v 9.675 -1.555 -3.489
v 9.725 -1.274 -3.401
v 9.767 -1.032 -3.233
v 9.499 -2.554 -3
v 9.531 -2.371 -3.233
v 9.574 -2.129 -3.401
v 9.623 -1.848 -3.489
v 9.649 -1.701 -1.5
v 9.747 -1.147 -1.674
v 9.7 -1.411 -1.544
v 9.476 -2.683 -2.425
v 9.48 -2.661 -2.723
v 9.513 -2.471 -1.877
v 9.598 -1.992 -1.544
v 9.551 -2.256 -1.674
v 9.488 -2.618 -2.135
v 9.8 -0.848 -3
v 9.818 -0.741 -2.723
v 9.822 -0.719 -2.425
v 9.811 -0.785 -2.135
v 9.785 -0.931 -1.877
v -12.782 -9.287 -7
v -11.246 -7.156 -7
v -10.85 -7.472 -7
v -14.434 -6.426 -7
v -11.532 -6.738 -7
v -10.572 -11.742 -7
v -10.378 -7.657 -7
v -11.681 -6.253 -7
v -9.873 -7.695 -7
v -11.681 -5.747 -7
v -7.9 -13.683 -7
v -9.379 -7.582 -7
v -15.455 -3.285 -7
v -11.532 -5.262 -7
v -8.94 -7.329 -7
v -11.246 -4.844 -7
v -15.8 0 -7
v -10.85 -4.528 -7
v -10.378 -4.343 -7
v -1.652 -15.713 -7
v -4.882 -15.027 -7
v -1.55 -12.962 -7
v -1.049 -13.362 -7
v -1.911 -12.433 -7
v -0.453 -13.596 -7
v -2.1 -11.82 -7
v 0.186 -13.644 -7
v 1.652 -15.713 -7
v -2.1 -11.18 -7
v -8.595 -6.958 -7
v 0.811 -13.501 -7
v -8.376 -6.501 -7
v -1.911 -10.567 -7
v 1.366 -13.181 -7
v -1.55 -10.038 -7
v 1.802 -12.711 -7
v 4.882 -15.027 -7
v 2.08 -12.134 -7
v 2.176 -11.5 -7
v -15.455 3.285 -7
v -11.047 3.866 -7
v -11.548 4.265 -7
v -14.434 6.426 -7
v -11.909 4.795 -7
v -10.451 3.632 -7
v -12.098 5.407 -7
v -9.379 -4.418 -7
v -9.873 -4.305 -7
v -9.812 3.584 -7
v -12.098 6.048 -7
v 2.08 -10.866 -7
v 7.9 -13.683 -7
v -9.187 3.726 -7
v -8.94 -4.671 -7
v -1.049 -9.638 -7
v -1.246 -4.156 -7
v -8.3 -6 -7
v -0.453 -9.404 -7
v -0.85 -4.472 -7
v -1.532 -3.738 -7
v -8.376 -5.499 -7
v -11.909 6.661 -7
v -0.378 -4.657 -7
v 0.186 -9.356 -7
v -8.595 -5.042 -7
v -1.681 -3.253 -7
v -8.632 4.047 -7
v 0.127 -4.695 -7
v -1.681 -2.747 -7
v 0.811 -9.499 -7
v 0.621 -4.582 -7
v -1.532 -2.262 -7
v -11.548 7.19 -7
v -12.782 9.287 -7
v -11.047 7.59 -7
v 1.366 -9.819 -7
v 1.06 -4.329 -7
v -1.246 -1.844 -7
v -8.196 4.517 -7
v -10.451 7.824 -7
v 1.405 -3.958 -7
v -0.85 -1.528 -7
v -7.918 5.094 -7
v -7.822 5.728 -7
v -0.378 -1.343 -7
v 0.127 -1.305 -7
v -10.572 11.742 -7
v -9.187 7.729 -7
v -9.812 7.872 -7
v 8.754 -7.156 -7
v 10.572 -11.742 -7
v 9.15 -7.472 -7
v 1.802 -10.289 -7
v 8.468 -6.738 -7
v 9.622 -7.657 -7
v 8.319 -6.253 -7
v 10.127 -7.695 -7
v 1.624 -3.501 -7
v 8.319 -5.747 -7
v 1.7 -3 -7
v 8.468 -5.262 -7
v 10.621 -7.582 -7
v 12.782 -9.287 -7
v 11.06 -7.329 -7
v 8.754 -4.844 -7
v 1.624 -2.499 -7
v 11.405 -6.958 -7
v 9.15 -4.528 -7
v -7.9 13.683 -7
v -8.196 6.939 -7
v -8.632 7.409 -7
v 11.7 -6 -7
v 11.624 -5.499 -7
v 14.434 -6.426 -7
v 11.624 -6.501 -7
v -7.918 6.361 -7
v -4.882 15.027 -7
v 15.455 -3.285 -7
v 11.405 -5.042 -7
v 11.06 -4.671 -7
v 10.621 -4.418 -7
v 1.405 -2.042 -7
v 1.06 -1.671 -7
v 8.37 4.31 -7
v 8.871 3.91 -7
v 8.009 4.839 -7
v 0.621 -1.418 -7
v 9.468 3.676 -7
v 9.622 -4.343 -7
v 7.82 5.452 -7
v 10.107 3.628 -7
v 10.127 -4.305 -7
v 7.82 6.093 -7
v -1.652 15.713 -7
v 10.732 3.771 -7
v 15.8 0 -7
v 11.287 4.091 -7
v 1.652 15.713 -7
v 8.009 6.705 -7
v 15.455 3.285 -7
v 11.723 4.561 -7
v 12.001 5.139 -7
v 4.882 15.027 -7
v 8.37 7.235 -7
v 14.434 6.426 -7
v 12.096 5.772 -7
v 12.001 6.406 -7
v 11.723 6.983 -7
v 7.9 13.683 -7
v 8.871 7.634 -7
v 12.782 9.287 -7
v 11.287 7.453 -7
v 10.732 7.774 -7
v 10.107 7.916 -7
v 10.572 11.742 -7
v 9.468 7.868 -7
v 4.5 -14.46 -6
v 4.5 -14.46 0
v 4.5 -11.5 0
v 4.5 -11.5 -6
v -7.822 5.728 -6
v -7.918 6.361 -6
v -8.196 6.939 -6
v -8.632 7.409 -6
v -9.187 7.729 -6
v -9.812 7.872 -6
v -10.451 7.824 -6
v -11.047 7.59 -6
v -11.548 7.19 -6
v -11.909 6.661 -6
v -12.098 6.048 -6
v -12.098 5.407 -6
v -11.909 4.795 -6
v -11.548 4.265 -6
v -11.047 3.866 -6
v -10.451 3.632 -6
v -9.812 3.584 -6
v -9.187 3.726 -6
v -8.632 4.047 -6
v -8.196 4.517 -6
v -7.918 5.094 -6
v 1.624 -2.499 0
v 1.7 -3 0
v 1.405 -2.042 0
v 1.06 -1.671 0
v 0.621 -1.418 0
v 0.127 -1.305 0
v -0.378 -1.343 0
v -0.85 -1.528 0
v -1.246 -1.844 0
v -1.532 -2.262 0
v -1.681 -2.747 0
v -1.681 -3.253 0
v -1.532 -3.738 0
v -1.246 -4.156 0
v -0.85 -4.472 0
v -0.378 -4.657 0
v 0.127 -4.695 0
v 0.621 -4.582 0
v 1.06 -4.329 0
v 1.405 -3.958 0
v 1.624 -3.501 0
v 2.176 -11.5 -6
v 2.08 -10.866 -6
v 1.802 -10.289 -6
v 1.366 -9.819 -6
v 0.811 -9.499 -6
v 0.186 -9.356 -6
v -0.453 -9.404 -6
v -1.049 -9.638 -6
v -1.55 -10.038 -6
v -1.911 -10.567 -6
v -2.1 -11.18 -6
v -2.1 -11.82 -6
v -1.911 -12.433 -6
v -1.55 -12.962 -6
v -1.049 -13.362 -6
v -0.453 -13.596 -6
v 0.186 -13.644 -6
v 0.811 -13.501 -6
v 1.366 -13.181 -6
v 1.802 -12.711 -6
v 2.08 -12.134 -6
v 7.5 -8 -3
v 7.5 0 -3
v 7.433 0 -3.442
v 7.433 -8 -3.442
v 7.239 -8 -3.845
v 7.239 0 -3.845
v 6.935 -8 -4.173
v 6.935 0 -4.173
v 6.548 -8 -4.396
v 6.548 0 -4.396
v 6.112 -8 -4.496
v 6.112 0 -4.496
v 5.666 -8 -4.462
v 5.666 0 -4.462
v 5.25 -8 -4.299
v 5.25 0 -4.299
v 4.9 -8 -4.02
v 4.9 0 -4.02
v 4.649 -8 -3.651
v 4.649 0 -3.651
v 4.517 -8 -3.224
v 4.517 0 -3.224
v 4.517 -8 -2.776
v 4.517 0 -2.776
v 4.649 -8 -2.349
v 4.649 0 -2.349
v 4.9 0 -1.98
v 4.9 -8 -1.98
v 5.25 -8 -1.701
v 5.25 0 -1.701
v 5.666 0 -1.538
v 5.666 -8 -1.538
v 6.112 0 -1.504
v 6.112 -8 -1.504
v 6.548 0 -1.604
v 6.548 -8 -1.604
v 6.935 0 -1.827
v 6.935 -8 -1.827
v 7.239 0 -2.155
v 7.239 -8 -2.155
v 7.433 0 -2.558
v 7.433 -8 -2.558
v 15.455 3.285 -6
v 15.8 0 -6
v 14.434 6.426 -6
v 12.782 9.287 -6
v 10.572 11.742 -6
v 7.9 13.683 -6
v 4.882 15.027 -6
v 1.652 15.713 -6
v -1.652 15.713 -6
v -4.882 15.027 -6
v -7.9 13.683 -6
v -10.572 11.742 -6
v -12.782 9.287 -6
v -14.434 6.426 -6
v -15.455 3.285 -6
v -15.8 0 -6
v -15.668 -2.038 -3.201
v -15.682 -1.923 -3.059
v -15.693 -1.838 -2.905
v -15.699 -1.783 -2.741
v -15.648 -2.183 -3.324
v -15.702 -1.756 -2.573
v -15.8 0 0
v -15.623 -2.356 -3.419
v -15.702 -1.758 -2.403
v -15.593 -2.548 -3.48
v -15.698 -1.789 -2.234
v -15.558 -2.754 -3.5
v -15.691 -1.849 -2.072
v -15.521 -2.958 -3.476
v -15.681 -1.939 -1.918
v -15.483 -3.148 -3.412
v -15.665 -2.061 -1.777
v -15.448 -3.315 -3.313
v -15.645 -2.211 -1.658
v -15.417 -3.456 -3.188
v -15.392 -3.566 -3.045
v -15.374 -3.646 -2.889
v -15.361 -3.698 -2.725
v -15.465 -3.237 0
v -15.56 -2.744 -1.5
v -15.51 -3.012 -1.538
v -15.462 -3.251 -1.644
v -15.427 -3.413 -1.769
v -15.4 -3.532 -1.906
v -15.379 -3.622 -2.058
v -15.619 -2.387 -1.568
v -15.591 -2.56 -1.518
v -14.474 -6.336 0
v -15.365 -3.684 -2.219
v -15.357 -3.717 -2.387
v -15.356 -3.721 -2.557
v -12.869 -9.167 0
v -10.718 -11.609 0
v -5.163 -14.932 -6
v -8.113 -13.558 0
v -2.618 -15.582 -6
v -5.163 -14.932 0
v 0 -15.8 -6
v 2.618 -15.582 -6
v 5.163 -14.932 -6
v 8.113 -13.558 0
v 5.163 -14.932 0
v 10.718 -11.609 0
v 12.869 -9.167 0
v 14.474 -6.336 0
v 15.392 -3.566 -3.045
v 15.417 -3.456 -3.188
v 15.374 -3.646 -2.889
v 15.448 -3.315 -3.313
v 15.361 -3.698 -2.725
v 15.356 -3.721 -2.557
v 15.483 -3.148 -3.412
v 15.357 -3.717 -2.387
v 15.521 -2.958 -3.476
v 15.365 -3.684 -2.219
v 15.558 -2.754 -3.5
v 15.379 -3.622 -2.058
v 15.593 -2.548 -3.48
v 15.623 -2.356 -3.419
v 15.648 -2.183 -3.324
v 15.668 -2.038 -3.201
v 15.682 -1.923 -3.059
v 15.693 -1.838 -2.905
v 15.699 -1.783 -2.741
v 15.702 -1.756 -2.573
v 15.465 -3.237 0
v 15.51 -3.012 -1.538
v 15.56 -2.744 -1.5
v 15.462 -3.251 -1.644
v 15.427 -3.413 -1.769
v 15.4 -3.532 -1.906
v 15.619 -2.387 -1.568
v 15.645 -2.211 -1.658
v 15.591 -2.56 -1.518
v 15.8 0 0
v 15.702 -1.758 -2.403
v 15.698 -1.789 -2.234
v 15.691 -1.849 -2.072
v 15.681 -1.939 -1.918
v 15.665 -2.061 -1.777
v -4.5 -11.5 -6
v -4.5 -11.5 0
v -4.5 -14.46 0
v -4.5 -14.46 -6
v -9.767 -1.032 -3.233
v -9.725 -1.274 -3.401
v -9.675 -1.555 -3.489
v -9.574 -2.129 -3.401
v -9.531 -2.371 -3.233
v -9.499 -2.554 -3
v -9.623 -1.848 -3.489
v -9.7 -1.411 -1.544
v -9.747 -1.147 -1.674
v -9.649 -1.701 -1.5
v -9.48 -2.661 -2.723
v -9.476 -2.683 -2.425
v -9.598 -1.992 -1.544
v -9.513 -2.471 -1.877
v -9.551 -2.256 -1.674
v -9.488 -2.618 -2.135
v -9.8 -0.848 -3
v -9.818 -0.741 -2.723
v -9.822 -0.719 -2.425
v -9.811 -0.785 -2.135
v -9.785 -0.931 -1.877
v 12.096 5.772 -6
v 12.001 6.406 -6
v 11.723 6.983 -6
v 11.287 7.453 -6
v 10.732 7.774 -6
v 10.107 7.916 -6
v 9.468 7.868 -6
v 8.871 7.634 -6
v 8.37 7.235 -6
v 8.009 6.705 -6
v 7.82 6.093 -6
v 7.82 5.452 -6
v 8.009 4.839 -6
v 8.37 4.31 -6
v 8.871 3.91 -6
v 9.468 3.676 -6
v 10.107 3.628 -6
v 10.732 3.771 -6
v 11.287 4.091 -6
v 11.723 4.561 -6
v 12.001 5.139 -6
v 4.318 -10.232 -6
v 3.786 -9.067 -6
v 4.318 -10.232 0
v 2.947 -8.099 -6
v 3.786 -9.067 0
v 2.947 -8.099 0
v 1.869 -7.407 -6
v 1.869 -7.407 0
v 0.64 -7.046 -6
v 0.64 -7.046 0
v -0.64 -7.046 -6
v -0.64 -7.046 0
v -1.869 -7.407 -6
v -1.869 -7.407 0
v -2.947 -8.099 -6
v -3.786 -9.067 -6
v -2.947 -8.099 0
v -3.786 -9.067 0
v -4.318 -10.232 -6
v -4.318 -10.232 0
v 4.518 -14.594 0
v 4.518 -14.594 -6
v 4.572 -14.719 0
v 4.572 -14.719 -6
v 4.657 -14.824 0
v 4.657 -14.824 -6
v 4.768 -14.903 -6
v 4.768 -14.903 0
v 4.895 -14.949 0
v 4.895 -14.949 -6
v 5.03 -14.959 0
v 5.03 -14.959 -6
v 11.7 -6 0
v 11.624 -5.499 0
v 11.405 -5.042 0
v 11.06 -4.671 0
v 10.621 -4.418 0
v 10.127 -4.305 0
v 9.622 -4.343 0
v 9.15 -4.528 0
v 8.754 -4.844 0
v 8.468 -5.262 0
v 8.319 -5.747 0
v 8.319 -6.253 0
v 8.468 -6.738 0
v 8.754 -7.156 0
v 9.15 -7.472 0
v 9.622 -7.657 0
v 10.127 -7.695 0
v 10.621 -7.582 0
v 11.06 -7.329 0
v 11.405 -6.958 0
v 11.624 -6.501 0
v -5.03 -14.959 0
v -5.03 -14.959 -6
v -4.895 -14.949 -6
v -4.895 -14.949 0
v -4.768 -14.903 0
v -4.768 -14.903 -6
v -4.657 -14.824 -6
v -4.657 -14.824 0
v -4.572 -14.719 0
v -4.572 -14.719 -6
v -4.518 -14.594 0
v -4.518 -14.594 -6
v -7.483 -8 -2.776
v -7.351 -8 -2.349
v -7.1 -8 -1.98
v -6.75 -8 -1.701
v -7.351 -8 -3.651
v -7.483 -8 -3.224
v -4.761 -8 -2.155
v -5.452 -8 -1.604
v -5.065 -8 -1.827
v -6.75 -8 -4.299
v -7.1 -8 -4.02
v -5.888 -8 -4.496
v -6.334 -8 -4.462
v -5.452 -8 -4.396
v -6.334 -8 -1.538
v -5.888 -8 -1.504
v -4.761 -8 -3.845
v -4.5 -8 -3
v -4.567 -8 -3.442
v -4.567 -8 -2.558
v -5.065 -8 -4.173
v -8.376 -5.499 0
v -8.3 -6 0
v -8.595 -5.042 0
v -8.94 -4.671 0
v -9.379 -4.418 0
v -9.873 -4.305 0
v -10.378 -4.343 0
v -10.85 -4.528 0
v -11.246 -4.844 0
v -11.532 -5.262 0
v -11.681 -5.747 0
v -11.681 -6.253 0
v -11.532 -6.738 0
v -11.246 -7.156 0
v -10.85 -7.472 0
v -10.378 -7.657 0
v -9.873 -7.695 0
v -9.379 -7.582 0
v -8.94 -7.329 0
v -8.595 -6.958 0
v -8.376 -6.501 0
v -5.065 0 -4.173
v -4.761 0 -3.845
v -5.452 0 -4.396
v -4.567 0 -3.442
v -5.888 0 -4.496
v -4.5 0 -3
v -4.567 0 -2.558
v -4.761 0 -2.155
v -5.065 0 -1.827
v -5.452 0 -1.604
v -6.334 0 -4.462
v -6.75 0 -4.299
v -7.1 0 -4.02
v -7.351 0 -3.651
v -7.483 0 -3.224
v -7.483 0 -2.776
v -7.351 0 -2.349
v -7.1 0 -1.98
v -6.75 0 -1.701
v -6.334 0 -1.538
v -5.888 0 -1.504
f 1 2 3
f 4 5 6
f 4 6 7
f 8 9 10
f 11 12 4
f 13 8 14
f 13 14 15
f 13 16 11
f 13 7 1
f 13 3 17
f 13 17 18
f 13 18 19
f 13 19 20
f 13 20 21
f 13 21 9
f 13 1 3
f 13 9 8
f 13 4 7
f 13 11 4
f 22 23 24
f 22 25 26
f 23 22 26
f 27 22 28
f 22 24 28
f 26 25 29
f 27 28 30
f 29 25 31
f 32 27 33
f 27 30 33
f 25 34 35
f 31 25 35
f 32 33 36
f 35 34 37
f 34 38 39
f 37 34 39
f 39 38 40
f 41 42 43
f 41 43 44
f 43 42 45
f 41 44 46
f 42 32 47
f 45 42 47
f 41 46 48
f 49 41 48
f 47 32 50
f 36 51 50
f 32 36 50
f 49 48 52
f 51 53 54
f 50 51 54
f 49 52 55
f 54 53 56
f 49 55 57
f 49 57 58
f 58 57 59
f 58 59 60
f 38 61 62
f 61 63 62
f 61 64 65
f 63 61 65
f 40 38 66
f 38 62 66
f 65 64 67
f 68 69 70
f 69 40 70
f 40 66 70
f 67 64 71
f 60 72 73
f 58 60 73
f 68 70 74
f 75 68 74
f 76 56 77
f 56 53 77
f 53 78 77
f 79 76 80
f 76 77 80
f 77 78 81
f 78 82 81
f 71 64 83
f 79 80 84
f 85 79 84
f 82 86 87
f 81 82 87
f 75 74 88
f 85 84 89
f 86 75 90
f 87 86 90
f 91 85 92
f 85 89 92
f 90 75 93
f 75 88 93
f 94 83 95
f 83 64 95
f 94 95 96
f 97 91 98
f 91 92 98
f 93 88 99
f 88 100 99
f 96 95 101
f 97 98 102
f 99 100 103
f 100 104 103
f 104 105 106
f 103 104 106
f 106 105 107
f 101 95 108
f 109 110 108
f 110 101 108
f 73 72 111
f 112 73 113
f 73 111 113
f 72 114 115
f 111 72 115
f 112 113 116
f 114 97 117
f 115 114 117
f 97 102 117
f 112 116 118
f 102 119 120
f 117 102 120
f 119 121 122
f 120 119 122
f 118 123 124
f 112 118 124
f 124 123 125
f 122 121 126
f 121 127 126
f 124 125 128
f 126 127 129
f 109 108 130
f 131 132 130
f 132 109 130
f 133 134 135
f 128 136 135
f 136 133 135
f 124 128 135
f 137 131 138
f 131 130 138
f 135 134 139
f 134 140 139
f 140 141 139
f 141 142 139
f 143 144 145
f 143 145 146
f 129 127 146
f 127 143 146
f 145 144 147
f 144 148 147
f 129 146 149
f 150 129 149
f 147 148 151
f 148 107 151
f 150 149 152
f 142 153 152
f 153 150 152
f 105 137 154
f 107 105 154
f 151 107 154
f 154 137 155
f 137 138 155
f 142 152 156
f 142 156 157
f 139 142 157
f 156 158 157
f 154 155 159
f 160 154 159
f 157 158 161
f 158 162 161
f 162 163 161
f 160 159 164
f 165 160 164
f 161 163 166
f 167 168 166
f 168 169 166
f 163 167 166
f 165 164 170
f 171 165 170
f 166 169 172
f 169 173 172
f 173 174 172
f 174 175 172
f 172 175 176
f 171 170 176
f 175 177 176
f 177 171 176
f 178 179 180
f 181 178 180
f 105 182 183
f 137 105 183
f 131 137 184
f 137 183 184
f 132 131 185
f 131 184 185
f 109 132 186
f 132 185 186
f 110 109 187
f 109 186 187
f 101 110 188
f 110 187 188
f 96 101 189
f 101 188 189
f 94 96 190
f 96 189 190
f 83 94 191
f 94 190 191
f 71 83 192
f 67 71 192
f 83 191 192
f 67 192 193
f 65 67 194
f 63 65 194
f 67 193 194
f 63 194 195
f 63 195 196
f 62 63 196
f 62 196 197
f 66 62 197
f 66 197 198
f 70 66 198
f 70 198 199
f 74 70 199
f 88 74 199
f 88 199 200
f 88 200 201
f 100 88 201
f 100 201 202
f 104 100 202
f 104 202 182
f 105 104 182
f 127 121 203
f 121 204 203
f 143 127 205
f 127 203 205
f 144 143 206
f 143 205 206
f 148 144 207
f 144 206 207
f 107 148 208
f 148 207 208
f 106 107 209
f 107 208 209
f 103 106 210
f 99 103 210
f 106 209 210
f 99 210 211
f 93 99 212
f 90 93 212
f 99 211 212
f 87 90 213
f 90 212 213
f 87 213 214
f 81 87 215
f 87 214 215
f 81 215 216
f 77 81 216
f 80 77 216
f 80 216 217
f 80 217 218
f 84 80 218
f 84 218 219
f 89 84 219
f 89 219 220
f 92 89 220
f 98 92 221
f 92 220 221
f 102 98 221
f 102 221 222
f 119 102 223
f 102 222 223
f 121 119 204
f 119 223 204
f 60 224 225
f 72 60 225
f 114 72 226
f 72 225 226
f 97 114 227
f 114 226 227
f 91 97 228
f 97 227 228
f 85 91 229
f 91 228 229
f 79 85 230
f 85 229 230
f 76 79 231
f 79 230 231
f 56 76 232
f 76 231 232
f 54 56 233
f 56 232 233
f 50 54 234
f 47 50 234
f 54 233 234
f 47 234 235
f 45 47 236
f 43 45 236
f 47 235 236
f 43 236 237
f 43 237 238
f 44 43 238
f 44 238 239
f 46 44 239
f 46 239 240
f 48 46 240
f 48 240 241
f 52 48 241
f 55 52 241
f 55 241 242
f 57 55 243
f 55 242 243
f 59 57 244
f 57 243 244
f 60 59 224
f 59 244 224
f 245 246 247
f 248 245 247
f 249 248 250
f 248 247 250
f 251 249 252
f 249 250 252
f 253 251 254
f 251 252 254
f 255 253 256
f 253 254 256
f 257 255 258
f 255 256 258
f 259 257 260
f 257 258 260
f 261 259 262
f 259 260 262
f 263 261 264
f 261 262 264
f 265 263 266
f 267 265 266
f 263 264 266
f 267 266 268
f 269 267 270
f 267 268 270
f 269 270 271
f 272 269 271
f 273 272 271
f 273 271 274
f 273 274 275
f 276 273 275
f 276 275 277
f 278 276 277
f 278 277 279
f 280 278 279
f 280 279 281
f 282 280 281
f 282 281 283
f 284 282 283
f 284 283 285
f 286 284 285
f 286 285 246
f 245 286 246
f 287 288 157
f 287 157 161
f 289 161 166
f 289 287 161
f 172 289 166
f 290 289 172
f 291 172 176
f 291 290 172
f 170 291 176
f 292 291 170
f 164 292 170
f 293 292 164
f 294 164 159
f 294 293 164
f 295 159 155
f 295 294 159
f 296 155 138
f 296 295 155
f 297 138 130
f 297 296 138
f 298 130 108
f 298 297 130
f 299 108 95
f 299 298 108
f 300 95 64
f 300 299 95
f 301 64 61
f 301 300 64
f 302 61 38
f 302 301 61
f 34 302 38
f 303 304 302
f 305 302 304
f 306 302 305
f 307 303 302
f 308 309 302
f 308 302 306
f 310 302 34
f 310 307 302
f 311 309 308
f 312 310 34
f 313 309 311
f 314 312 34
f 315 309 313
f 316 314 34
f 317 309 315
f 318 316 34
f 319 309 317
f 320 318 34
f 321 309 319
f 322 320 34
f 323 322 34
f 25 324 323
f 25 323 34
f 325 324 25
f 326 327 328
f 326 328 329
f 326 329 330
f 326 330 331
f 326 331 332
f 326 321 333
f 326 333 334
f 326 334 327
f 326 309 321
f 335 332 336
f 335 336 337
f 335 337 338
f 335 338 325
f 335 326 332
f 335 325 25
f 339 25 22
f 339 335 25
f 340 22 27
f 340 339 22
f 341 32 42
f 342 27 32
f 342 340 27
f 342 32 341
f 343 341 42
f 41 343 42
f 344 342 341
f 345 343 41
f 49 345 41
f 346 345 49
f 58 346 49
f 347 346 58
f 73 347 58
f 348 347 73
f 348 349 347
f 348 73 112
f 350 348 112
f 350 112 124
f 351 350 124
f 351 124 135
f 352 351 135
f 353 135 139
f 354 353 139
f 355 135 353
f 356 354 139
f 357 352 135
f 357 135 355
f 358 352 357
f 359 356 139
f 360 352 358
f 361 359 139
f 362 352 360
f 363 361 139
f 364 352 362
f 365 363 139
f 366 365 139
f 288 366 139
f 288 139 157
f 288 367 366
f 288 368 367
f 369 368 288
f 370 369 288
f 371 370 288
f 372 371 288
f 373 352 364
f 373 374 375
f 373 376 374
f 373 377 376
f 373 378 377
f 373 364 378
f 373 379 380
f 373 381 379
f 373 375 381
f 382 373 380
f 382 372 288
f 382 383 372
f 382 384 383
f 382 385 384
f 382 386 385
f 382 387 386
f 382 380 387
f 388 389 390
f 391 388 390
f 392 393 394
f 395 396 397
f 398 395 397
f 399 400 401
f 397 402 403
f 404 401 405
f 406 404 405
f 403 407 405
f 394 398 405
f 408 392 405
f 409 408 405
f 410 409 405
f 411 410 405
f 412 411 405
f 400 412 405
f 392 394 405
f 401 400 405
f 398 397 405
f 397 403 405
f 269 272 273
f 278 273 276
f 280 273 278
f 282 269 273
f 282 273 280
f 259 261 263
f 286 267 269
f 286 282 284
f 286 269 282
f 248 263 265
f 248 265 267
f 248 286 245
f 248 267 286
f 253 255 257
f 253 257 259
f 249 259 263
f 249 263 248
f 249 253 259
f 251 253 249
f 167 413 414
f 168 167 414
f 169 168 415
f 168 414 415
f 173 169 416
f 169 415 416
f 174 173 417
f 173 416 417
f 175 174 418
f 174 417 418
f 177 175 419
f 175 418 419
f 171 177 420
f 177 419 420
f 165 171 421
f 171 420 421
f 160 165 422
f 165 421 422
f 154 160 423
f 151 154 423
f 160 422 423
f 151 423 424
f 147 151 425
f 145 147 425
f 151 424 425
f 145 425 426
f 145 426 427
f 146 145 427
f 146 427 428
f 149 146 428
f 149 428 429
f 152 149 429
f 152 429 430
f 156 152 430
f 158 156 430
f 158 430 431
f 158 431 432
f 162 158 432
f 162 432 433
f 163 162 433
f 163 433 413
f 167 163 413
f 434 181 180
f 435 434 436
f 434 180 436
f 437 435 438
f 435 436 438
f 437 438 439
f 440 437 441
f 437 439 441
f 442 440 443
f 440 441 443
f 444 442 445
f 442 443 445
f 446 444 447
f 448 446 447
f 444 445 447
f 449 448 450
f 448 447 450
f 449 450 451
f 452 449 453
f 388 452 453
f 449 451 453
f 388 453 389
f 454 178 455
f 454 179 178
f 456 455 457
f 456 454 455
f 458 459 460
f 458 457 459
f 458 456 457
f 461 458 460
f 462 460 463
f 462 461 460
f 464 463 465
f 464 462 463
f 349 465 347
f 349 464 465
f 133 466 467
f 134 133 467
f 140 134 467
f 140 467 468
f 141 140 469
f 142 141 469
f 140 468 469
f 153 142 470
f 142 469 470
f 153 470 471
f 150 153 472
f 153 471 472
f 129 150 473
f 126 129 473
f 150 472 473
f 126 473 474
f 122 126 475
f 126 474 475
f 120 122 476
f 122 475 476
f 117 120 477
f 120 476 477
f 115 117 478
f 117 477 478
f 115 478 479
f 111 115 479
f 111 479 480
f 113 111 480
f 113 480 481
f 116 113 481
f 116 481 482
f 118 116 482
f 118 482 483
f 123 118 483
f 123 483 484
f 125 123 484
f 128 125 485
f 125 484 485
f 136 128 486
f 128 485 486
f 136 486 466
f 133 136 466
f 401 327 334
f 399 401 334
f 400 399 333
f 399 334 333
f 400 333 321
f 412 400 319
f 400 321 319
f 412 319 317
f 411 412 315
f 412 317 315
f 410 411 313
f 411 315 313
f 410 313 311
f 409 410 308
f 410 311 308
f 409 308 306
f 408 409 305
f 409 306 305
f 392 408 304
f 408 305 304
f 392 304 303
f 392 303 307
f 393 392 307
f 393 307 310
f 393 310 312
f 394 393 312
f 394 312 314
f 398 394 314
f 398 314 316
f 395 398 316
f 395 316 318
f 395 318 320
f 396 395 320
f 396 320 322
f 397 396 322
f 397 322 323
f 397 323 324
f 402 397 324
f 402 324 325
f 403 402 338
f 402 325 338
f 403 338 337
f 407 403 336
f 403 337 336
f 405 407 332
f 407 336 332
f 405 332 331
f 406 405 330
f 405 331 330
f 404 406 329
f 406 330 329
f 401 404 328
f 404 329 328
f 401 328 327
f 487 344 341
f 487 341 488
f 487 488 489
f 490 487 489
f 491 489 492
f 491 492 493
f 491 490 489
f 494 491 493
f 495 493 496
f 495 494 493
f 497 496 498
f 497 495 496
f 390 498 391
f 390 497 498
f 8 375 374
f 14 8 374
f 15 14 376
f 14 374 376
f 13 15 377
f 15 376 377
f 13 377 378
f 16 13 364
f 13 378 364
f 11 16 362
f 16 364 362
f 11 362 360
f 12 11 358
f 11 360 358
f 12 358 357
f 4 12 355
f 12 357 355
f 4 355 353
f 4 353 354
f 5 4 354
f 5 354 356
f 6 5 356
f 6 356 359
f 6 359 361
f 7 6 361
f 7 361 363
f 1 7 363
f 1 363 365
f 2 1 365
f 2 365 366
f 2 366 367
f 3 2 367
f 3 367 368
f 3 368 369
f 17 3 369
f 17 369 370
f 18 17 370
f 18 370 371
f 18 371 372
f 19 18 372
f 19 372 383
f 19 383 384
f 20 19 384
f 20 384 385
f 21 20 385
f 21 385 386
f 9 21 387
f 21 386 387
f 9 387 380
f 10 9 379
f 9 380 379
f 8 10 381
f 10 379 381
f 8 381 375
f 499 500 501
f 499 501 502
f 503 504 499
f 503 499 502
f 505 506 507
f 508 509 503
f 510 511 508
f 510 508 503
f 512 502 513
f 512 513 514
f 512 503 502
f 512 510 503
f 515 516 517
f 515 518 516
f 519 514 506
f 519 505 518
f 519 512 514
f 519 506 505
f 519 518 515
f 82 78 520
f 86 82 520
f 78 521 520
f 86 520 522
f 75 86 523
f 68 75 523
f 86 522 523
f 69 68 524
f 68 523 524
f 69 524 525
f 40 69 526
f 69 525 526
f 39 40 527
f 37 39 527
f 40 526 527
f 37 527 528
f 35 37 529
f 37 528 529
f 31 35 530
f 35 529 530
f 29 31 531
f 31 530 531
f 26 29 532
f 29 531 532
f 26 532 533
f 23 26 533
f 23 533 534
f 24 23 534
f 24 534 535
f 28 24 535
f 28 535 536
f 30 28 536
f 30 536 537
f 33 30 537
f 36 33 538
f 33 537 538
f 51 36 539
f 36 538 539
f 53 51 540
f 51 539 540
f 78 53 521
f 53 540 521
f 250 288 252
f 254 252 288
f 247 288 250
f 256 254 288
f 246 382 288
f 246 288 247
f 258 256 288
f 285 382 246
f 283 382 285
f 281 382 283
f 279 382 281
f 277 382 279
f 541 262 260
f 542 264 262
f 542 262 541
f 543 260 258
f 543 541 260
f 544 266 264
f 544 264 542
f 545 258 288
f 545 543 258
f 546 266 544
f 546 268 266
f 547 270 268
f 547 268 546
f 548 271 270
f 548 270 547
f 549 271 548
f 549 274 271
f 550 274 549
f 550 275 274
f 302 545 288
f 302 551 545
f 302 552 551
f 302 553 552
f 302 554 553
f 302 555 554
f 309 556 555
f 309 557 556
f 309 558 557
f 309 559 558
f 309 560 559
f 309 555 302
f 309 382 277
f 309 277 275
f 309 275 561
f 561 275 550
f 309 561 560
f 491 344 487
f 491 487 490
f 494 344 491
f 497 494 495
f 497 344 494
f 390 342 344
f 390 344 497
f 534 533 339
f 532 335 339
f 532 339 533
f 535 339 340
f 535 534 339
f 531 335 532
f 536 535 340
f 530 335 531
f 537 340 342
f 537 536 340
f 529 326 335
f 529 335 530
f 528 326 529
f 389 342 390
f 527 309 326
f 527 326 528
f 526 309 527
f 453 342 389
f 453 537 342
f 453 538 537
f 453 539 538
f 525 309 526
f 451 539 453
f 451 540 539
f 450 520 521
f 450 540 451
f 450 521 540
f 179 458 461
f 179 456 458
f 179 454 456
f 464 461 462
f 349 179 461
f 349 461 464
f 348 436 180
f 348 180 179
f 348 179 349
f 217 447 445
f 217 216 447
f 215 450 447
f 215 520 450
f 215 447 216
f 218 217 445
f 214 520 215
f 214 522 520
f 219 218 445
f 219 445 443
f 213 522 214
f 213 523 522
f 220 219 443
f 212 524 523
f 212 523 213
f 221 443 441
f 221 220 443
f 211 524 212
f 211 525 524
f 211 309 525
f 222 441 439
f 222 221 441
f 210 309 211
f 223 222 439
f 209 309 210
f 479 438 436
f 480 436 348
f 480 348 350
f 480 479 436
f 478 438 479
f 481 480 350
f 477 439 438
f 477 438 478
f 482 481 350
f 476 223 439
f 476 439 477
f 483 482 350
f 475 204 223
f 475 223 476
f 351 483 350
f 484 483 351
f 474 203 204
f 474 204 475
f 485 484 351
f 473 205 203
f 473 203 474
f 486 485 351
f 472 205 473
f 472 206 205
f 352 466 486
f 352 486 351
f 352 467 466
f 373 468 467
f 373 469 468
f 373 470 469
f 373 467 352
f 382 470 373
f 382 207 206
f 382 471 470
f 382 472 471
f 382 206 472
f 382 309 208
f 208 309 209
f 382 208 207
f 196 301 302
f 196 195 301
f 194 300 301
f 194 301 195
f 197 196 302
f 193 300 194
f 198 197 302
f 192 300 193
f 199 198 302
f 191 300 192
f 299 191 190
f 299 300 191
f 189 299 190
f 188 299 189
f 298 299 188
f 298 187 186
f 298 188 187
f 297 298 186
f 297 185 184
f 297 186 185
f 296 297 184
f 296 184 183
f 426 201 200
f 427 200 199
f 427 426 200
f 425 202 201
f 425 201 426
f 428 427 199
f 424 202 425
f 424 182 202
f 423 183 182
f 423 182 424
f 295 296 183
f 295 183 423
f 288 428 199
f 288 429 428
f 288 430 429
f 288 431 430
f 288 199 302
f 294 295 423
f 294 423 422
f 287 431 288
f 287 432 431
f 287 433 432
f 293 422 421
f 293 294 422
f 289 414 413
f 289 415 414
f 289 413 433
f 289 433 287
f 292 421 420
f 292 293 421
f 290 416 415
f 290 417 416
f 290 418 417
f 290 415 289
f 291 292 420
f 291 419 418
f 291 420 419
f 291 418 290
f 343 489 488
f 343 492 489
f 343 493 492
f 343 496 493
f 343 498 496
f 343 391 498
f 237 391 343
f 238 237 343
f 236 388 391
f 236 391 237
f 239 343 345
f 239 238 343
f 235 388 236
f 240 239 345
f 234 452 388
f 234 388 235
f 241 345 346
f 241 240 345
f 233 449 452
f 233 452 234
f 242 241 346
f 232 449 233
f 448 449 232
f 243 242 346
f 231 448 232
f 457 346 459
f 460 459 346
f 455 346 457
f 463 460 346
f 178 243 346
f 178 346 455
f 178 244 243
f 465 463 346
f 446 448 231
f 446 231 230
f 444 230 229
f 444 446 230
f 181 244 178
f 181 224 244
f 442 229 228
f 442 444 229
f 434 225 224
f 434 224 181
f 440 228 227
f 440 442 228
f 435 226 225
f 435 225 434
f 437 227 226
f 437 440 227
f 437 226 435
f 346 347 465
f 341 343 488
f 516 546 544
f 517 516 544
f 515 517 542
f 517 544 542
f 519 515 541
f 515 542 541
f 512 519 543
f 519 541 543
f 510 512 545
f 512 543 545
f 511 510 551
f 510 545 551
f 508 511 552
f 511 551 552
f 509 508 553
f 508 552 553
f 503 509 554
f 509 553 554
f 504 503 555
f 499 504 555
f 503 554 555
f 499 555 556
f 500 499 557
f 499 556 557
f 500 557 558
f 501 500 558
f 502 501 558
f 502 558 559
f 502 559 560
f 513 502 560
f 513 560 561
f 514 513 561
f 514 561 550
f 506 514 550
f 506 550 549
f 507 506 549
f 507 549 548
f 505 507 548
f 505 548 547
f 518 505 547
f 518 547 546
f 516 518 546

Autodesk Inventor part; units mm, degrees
ref_plane "XZ Plane" through (0, 0, 0) normal (0, 1, 0) x (-1, 0, 0)
sketch "スケッチ2" plane through (0, 0, 0) normal (0, 0, 1) x (1, 0, 0)
  circle A0 centre (0, 0) radius 15.8
  dimension "d0" = 31.6
extrude "押し出し1" add sketch "スケッチ2" against normal blind 7
sketch "スケッチ4" plane through (0, 0, 0) normal (0, 0, 1) x (1, 0, 0)
  circle A0 centre (0.0258, -11.5) radius 2.15
  circle A1 centre (9.9464, 5.7723) radius 2.15
  circle A2 centre (-9.9722, 5.7277) radius 2.15
  point P0 (0, 0)
  dimension "d8" = 4.3
  dimension "d9" = 11.5
  dimension "d12" = 360
extrude "押し出し3" cut sketch "スケッチ4" against normal through all
sketch "スケッチ9" plane through (0, 0, 0) normal (0, 0, 1) x (1, 0, 0)
  line L0 (4.5, -18.9204) -> (4.5, -11.5)
  line L1 (0, -7) -> (0, -7)
  line L2 (-4.5, -11.5) -> (-4.5, -18.9204)
  line L3 (-4.5, -18.9204) -> (4.5, -18.9204)
  line L4 (0, 0) -> (0, -22.6433) construction
  arc A0 (4.5, -11.5) -> (0, -7) centre (0, -11.5) ccw
  arc A1 (0, -7) -> (-4.5, -11.5) centre (0, -11.5) ccw
  point P0 (4.5, -7)
  point P1 (-4.5, -7)
  point P2 (0, -7)
  point P3 (0, -7)
  dimension "d55" = 9
  dimension "d56" = 7
  dimension "d57" = 4.5
extrude "押し出し7" cut sketch "スケッチ9" against normal blind 6
fillet "フィレット1" radius 0.5 2 edges at (4.5, -15.1456, -3) (-4.5, -15.1456, -3)
sketch "スケッチ13" plane through (0, 0, 0) normal (0, 0, 1) x (1, 0, 0)
  circle A0 centre (-10, -6) radius 1.7
  circle A1 centre (10, -6) radius 1.7
  circle A2 centre (0, -3) radius 1.7
  line L0 (0, 0) -> (0, -19.4065)
  line L1 (0, 0) -> (20.4623, 0)
  point P0 (0, -4.7)
  point P1 (0, -1.3)
  dimension "d125" = 3.4
  dimension "d126" = 3.4
  dimension "d127" = 3.4
  dimension "d128" = 6
  dimension "d129" = 3
  dimension "d130" = 10
extrude "押し出し11" cut sketch "スケッチ13" against normal through all
ref_plane "作業平面6" through (0, 0, 0) normal (0.9848078, -0.1736482, 0) x (0, 0, 1)
ref_plane "作業平面7" through (0, 0, 0) normal (0.9848078, 0.1736482, 0) x (0, 0, 1)
ref_plane "作業平面8" through (15.56, -2.7436, 0) normal (0.9848078, -0.1736482, 0) x (0, 0, 1)
ref_plane "作業平面9" through (-15.56, -2.7436, 0) normal (0.9848078, 0.1736482, 0) x (0, 0, 1)
sketch "スケッチ15" plane through (15.56, -2.7436, 0) normal (0.9848078, -0.1736482, 0) x (0, 0, 1)
  circle A0 centre (-2.5, 0) radius 1
  point P0 (0, 0)
  dimension "d103" = 2
  dimension "d104" = 2.5
sketch "スケッチ16" plane through (-15.56, -2.7436, 0) normal (0.9848078, 0.1736482, 0) x (0, 0, 1)
  circle A0 centre (-2.5, 0) radius 1
  point P0 (0, 0)
  dimension "d105" = 2
  dimension "d106" = 2.5
extrude "押し出し12" cut sketch "スケッチ16" along normal blind 6
extrude "押し出し13" cut sketch "スケッチ15" against normal blind 6
thread "ねじ10" size "M2x0.4" class "6H" standard "ANSI Metric M Profile" full length
thread "ねじ11" size "M2x0.4" class "6H" standard "ANSI Metric M Profile" full length
sketch "スケッチ18" plane through (0, 0, 0) normal (0, 0, 1) x (1, 0, 0)
  line L0 (-18.9802, 17.2113) -> (19.0758, 17.2113)
  line L1 (19.0758, 17.2113) -> (19.0758, 0)
  line L2 (19.0758, 0) -> (-18.9802, 0)
  line L3 (-18.9802, 0) -> (-18.9802, 17.2113)
  point P0 (0, 0)
  point P1 (0.0478, 0)
  dimension "d141" = 0
extrude "押し出し15" cut sketch "スケッチ18" against normal blind 6
sketch "スケッチ20" plane through (-15.8, 0, 0) normal (0, 1, 0) x (1, 0, 0)
  line L0 (15.8, 0) -> (15.8, 8.7821) construction
  line L1 (0, 0) -> (0, 6) projected
  line L2 (0, 3) -> (33.9854, 3) construction
  circle A0 centre (9.8, 3) radius 1.5
  circle A1 centre (21.8, 3) radius 1.5
  line L3 (31.6, 0) -> (0, 0) projected
  dimension "d132" = 3
  dimension "d133" = 3
  dimension "d134" = 6
extrude "押し出し16" cut sketch "スケッチ20" against normal blind 8
thread "ねじ13" size "M3x0.5" class "6H" standard "ANSI Metric M Profile" full length
thread "ねじ14" size "M3x0.5" class "6H" standard "ANSI Metric M Profile" full length
properties part number "B_probehead_5" material "ステンレス鋼 440C"
